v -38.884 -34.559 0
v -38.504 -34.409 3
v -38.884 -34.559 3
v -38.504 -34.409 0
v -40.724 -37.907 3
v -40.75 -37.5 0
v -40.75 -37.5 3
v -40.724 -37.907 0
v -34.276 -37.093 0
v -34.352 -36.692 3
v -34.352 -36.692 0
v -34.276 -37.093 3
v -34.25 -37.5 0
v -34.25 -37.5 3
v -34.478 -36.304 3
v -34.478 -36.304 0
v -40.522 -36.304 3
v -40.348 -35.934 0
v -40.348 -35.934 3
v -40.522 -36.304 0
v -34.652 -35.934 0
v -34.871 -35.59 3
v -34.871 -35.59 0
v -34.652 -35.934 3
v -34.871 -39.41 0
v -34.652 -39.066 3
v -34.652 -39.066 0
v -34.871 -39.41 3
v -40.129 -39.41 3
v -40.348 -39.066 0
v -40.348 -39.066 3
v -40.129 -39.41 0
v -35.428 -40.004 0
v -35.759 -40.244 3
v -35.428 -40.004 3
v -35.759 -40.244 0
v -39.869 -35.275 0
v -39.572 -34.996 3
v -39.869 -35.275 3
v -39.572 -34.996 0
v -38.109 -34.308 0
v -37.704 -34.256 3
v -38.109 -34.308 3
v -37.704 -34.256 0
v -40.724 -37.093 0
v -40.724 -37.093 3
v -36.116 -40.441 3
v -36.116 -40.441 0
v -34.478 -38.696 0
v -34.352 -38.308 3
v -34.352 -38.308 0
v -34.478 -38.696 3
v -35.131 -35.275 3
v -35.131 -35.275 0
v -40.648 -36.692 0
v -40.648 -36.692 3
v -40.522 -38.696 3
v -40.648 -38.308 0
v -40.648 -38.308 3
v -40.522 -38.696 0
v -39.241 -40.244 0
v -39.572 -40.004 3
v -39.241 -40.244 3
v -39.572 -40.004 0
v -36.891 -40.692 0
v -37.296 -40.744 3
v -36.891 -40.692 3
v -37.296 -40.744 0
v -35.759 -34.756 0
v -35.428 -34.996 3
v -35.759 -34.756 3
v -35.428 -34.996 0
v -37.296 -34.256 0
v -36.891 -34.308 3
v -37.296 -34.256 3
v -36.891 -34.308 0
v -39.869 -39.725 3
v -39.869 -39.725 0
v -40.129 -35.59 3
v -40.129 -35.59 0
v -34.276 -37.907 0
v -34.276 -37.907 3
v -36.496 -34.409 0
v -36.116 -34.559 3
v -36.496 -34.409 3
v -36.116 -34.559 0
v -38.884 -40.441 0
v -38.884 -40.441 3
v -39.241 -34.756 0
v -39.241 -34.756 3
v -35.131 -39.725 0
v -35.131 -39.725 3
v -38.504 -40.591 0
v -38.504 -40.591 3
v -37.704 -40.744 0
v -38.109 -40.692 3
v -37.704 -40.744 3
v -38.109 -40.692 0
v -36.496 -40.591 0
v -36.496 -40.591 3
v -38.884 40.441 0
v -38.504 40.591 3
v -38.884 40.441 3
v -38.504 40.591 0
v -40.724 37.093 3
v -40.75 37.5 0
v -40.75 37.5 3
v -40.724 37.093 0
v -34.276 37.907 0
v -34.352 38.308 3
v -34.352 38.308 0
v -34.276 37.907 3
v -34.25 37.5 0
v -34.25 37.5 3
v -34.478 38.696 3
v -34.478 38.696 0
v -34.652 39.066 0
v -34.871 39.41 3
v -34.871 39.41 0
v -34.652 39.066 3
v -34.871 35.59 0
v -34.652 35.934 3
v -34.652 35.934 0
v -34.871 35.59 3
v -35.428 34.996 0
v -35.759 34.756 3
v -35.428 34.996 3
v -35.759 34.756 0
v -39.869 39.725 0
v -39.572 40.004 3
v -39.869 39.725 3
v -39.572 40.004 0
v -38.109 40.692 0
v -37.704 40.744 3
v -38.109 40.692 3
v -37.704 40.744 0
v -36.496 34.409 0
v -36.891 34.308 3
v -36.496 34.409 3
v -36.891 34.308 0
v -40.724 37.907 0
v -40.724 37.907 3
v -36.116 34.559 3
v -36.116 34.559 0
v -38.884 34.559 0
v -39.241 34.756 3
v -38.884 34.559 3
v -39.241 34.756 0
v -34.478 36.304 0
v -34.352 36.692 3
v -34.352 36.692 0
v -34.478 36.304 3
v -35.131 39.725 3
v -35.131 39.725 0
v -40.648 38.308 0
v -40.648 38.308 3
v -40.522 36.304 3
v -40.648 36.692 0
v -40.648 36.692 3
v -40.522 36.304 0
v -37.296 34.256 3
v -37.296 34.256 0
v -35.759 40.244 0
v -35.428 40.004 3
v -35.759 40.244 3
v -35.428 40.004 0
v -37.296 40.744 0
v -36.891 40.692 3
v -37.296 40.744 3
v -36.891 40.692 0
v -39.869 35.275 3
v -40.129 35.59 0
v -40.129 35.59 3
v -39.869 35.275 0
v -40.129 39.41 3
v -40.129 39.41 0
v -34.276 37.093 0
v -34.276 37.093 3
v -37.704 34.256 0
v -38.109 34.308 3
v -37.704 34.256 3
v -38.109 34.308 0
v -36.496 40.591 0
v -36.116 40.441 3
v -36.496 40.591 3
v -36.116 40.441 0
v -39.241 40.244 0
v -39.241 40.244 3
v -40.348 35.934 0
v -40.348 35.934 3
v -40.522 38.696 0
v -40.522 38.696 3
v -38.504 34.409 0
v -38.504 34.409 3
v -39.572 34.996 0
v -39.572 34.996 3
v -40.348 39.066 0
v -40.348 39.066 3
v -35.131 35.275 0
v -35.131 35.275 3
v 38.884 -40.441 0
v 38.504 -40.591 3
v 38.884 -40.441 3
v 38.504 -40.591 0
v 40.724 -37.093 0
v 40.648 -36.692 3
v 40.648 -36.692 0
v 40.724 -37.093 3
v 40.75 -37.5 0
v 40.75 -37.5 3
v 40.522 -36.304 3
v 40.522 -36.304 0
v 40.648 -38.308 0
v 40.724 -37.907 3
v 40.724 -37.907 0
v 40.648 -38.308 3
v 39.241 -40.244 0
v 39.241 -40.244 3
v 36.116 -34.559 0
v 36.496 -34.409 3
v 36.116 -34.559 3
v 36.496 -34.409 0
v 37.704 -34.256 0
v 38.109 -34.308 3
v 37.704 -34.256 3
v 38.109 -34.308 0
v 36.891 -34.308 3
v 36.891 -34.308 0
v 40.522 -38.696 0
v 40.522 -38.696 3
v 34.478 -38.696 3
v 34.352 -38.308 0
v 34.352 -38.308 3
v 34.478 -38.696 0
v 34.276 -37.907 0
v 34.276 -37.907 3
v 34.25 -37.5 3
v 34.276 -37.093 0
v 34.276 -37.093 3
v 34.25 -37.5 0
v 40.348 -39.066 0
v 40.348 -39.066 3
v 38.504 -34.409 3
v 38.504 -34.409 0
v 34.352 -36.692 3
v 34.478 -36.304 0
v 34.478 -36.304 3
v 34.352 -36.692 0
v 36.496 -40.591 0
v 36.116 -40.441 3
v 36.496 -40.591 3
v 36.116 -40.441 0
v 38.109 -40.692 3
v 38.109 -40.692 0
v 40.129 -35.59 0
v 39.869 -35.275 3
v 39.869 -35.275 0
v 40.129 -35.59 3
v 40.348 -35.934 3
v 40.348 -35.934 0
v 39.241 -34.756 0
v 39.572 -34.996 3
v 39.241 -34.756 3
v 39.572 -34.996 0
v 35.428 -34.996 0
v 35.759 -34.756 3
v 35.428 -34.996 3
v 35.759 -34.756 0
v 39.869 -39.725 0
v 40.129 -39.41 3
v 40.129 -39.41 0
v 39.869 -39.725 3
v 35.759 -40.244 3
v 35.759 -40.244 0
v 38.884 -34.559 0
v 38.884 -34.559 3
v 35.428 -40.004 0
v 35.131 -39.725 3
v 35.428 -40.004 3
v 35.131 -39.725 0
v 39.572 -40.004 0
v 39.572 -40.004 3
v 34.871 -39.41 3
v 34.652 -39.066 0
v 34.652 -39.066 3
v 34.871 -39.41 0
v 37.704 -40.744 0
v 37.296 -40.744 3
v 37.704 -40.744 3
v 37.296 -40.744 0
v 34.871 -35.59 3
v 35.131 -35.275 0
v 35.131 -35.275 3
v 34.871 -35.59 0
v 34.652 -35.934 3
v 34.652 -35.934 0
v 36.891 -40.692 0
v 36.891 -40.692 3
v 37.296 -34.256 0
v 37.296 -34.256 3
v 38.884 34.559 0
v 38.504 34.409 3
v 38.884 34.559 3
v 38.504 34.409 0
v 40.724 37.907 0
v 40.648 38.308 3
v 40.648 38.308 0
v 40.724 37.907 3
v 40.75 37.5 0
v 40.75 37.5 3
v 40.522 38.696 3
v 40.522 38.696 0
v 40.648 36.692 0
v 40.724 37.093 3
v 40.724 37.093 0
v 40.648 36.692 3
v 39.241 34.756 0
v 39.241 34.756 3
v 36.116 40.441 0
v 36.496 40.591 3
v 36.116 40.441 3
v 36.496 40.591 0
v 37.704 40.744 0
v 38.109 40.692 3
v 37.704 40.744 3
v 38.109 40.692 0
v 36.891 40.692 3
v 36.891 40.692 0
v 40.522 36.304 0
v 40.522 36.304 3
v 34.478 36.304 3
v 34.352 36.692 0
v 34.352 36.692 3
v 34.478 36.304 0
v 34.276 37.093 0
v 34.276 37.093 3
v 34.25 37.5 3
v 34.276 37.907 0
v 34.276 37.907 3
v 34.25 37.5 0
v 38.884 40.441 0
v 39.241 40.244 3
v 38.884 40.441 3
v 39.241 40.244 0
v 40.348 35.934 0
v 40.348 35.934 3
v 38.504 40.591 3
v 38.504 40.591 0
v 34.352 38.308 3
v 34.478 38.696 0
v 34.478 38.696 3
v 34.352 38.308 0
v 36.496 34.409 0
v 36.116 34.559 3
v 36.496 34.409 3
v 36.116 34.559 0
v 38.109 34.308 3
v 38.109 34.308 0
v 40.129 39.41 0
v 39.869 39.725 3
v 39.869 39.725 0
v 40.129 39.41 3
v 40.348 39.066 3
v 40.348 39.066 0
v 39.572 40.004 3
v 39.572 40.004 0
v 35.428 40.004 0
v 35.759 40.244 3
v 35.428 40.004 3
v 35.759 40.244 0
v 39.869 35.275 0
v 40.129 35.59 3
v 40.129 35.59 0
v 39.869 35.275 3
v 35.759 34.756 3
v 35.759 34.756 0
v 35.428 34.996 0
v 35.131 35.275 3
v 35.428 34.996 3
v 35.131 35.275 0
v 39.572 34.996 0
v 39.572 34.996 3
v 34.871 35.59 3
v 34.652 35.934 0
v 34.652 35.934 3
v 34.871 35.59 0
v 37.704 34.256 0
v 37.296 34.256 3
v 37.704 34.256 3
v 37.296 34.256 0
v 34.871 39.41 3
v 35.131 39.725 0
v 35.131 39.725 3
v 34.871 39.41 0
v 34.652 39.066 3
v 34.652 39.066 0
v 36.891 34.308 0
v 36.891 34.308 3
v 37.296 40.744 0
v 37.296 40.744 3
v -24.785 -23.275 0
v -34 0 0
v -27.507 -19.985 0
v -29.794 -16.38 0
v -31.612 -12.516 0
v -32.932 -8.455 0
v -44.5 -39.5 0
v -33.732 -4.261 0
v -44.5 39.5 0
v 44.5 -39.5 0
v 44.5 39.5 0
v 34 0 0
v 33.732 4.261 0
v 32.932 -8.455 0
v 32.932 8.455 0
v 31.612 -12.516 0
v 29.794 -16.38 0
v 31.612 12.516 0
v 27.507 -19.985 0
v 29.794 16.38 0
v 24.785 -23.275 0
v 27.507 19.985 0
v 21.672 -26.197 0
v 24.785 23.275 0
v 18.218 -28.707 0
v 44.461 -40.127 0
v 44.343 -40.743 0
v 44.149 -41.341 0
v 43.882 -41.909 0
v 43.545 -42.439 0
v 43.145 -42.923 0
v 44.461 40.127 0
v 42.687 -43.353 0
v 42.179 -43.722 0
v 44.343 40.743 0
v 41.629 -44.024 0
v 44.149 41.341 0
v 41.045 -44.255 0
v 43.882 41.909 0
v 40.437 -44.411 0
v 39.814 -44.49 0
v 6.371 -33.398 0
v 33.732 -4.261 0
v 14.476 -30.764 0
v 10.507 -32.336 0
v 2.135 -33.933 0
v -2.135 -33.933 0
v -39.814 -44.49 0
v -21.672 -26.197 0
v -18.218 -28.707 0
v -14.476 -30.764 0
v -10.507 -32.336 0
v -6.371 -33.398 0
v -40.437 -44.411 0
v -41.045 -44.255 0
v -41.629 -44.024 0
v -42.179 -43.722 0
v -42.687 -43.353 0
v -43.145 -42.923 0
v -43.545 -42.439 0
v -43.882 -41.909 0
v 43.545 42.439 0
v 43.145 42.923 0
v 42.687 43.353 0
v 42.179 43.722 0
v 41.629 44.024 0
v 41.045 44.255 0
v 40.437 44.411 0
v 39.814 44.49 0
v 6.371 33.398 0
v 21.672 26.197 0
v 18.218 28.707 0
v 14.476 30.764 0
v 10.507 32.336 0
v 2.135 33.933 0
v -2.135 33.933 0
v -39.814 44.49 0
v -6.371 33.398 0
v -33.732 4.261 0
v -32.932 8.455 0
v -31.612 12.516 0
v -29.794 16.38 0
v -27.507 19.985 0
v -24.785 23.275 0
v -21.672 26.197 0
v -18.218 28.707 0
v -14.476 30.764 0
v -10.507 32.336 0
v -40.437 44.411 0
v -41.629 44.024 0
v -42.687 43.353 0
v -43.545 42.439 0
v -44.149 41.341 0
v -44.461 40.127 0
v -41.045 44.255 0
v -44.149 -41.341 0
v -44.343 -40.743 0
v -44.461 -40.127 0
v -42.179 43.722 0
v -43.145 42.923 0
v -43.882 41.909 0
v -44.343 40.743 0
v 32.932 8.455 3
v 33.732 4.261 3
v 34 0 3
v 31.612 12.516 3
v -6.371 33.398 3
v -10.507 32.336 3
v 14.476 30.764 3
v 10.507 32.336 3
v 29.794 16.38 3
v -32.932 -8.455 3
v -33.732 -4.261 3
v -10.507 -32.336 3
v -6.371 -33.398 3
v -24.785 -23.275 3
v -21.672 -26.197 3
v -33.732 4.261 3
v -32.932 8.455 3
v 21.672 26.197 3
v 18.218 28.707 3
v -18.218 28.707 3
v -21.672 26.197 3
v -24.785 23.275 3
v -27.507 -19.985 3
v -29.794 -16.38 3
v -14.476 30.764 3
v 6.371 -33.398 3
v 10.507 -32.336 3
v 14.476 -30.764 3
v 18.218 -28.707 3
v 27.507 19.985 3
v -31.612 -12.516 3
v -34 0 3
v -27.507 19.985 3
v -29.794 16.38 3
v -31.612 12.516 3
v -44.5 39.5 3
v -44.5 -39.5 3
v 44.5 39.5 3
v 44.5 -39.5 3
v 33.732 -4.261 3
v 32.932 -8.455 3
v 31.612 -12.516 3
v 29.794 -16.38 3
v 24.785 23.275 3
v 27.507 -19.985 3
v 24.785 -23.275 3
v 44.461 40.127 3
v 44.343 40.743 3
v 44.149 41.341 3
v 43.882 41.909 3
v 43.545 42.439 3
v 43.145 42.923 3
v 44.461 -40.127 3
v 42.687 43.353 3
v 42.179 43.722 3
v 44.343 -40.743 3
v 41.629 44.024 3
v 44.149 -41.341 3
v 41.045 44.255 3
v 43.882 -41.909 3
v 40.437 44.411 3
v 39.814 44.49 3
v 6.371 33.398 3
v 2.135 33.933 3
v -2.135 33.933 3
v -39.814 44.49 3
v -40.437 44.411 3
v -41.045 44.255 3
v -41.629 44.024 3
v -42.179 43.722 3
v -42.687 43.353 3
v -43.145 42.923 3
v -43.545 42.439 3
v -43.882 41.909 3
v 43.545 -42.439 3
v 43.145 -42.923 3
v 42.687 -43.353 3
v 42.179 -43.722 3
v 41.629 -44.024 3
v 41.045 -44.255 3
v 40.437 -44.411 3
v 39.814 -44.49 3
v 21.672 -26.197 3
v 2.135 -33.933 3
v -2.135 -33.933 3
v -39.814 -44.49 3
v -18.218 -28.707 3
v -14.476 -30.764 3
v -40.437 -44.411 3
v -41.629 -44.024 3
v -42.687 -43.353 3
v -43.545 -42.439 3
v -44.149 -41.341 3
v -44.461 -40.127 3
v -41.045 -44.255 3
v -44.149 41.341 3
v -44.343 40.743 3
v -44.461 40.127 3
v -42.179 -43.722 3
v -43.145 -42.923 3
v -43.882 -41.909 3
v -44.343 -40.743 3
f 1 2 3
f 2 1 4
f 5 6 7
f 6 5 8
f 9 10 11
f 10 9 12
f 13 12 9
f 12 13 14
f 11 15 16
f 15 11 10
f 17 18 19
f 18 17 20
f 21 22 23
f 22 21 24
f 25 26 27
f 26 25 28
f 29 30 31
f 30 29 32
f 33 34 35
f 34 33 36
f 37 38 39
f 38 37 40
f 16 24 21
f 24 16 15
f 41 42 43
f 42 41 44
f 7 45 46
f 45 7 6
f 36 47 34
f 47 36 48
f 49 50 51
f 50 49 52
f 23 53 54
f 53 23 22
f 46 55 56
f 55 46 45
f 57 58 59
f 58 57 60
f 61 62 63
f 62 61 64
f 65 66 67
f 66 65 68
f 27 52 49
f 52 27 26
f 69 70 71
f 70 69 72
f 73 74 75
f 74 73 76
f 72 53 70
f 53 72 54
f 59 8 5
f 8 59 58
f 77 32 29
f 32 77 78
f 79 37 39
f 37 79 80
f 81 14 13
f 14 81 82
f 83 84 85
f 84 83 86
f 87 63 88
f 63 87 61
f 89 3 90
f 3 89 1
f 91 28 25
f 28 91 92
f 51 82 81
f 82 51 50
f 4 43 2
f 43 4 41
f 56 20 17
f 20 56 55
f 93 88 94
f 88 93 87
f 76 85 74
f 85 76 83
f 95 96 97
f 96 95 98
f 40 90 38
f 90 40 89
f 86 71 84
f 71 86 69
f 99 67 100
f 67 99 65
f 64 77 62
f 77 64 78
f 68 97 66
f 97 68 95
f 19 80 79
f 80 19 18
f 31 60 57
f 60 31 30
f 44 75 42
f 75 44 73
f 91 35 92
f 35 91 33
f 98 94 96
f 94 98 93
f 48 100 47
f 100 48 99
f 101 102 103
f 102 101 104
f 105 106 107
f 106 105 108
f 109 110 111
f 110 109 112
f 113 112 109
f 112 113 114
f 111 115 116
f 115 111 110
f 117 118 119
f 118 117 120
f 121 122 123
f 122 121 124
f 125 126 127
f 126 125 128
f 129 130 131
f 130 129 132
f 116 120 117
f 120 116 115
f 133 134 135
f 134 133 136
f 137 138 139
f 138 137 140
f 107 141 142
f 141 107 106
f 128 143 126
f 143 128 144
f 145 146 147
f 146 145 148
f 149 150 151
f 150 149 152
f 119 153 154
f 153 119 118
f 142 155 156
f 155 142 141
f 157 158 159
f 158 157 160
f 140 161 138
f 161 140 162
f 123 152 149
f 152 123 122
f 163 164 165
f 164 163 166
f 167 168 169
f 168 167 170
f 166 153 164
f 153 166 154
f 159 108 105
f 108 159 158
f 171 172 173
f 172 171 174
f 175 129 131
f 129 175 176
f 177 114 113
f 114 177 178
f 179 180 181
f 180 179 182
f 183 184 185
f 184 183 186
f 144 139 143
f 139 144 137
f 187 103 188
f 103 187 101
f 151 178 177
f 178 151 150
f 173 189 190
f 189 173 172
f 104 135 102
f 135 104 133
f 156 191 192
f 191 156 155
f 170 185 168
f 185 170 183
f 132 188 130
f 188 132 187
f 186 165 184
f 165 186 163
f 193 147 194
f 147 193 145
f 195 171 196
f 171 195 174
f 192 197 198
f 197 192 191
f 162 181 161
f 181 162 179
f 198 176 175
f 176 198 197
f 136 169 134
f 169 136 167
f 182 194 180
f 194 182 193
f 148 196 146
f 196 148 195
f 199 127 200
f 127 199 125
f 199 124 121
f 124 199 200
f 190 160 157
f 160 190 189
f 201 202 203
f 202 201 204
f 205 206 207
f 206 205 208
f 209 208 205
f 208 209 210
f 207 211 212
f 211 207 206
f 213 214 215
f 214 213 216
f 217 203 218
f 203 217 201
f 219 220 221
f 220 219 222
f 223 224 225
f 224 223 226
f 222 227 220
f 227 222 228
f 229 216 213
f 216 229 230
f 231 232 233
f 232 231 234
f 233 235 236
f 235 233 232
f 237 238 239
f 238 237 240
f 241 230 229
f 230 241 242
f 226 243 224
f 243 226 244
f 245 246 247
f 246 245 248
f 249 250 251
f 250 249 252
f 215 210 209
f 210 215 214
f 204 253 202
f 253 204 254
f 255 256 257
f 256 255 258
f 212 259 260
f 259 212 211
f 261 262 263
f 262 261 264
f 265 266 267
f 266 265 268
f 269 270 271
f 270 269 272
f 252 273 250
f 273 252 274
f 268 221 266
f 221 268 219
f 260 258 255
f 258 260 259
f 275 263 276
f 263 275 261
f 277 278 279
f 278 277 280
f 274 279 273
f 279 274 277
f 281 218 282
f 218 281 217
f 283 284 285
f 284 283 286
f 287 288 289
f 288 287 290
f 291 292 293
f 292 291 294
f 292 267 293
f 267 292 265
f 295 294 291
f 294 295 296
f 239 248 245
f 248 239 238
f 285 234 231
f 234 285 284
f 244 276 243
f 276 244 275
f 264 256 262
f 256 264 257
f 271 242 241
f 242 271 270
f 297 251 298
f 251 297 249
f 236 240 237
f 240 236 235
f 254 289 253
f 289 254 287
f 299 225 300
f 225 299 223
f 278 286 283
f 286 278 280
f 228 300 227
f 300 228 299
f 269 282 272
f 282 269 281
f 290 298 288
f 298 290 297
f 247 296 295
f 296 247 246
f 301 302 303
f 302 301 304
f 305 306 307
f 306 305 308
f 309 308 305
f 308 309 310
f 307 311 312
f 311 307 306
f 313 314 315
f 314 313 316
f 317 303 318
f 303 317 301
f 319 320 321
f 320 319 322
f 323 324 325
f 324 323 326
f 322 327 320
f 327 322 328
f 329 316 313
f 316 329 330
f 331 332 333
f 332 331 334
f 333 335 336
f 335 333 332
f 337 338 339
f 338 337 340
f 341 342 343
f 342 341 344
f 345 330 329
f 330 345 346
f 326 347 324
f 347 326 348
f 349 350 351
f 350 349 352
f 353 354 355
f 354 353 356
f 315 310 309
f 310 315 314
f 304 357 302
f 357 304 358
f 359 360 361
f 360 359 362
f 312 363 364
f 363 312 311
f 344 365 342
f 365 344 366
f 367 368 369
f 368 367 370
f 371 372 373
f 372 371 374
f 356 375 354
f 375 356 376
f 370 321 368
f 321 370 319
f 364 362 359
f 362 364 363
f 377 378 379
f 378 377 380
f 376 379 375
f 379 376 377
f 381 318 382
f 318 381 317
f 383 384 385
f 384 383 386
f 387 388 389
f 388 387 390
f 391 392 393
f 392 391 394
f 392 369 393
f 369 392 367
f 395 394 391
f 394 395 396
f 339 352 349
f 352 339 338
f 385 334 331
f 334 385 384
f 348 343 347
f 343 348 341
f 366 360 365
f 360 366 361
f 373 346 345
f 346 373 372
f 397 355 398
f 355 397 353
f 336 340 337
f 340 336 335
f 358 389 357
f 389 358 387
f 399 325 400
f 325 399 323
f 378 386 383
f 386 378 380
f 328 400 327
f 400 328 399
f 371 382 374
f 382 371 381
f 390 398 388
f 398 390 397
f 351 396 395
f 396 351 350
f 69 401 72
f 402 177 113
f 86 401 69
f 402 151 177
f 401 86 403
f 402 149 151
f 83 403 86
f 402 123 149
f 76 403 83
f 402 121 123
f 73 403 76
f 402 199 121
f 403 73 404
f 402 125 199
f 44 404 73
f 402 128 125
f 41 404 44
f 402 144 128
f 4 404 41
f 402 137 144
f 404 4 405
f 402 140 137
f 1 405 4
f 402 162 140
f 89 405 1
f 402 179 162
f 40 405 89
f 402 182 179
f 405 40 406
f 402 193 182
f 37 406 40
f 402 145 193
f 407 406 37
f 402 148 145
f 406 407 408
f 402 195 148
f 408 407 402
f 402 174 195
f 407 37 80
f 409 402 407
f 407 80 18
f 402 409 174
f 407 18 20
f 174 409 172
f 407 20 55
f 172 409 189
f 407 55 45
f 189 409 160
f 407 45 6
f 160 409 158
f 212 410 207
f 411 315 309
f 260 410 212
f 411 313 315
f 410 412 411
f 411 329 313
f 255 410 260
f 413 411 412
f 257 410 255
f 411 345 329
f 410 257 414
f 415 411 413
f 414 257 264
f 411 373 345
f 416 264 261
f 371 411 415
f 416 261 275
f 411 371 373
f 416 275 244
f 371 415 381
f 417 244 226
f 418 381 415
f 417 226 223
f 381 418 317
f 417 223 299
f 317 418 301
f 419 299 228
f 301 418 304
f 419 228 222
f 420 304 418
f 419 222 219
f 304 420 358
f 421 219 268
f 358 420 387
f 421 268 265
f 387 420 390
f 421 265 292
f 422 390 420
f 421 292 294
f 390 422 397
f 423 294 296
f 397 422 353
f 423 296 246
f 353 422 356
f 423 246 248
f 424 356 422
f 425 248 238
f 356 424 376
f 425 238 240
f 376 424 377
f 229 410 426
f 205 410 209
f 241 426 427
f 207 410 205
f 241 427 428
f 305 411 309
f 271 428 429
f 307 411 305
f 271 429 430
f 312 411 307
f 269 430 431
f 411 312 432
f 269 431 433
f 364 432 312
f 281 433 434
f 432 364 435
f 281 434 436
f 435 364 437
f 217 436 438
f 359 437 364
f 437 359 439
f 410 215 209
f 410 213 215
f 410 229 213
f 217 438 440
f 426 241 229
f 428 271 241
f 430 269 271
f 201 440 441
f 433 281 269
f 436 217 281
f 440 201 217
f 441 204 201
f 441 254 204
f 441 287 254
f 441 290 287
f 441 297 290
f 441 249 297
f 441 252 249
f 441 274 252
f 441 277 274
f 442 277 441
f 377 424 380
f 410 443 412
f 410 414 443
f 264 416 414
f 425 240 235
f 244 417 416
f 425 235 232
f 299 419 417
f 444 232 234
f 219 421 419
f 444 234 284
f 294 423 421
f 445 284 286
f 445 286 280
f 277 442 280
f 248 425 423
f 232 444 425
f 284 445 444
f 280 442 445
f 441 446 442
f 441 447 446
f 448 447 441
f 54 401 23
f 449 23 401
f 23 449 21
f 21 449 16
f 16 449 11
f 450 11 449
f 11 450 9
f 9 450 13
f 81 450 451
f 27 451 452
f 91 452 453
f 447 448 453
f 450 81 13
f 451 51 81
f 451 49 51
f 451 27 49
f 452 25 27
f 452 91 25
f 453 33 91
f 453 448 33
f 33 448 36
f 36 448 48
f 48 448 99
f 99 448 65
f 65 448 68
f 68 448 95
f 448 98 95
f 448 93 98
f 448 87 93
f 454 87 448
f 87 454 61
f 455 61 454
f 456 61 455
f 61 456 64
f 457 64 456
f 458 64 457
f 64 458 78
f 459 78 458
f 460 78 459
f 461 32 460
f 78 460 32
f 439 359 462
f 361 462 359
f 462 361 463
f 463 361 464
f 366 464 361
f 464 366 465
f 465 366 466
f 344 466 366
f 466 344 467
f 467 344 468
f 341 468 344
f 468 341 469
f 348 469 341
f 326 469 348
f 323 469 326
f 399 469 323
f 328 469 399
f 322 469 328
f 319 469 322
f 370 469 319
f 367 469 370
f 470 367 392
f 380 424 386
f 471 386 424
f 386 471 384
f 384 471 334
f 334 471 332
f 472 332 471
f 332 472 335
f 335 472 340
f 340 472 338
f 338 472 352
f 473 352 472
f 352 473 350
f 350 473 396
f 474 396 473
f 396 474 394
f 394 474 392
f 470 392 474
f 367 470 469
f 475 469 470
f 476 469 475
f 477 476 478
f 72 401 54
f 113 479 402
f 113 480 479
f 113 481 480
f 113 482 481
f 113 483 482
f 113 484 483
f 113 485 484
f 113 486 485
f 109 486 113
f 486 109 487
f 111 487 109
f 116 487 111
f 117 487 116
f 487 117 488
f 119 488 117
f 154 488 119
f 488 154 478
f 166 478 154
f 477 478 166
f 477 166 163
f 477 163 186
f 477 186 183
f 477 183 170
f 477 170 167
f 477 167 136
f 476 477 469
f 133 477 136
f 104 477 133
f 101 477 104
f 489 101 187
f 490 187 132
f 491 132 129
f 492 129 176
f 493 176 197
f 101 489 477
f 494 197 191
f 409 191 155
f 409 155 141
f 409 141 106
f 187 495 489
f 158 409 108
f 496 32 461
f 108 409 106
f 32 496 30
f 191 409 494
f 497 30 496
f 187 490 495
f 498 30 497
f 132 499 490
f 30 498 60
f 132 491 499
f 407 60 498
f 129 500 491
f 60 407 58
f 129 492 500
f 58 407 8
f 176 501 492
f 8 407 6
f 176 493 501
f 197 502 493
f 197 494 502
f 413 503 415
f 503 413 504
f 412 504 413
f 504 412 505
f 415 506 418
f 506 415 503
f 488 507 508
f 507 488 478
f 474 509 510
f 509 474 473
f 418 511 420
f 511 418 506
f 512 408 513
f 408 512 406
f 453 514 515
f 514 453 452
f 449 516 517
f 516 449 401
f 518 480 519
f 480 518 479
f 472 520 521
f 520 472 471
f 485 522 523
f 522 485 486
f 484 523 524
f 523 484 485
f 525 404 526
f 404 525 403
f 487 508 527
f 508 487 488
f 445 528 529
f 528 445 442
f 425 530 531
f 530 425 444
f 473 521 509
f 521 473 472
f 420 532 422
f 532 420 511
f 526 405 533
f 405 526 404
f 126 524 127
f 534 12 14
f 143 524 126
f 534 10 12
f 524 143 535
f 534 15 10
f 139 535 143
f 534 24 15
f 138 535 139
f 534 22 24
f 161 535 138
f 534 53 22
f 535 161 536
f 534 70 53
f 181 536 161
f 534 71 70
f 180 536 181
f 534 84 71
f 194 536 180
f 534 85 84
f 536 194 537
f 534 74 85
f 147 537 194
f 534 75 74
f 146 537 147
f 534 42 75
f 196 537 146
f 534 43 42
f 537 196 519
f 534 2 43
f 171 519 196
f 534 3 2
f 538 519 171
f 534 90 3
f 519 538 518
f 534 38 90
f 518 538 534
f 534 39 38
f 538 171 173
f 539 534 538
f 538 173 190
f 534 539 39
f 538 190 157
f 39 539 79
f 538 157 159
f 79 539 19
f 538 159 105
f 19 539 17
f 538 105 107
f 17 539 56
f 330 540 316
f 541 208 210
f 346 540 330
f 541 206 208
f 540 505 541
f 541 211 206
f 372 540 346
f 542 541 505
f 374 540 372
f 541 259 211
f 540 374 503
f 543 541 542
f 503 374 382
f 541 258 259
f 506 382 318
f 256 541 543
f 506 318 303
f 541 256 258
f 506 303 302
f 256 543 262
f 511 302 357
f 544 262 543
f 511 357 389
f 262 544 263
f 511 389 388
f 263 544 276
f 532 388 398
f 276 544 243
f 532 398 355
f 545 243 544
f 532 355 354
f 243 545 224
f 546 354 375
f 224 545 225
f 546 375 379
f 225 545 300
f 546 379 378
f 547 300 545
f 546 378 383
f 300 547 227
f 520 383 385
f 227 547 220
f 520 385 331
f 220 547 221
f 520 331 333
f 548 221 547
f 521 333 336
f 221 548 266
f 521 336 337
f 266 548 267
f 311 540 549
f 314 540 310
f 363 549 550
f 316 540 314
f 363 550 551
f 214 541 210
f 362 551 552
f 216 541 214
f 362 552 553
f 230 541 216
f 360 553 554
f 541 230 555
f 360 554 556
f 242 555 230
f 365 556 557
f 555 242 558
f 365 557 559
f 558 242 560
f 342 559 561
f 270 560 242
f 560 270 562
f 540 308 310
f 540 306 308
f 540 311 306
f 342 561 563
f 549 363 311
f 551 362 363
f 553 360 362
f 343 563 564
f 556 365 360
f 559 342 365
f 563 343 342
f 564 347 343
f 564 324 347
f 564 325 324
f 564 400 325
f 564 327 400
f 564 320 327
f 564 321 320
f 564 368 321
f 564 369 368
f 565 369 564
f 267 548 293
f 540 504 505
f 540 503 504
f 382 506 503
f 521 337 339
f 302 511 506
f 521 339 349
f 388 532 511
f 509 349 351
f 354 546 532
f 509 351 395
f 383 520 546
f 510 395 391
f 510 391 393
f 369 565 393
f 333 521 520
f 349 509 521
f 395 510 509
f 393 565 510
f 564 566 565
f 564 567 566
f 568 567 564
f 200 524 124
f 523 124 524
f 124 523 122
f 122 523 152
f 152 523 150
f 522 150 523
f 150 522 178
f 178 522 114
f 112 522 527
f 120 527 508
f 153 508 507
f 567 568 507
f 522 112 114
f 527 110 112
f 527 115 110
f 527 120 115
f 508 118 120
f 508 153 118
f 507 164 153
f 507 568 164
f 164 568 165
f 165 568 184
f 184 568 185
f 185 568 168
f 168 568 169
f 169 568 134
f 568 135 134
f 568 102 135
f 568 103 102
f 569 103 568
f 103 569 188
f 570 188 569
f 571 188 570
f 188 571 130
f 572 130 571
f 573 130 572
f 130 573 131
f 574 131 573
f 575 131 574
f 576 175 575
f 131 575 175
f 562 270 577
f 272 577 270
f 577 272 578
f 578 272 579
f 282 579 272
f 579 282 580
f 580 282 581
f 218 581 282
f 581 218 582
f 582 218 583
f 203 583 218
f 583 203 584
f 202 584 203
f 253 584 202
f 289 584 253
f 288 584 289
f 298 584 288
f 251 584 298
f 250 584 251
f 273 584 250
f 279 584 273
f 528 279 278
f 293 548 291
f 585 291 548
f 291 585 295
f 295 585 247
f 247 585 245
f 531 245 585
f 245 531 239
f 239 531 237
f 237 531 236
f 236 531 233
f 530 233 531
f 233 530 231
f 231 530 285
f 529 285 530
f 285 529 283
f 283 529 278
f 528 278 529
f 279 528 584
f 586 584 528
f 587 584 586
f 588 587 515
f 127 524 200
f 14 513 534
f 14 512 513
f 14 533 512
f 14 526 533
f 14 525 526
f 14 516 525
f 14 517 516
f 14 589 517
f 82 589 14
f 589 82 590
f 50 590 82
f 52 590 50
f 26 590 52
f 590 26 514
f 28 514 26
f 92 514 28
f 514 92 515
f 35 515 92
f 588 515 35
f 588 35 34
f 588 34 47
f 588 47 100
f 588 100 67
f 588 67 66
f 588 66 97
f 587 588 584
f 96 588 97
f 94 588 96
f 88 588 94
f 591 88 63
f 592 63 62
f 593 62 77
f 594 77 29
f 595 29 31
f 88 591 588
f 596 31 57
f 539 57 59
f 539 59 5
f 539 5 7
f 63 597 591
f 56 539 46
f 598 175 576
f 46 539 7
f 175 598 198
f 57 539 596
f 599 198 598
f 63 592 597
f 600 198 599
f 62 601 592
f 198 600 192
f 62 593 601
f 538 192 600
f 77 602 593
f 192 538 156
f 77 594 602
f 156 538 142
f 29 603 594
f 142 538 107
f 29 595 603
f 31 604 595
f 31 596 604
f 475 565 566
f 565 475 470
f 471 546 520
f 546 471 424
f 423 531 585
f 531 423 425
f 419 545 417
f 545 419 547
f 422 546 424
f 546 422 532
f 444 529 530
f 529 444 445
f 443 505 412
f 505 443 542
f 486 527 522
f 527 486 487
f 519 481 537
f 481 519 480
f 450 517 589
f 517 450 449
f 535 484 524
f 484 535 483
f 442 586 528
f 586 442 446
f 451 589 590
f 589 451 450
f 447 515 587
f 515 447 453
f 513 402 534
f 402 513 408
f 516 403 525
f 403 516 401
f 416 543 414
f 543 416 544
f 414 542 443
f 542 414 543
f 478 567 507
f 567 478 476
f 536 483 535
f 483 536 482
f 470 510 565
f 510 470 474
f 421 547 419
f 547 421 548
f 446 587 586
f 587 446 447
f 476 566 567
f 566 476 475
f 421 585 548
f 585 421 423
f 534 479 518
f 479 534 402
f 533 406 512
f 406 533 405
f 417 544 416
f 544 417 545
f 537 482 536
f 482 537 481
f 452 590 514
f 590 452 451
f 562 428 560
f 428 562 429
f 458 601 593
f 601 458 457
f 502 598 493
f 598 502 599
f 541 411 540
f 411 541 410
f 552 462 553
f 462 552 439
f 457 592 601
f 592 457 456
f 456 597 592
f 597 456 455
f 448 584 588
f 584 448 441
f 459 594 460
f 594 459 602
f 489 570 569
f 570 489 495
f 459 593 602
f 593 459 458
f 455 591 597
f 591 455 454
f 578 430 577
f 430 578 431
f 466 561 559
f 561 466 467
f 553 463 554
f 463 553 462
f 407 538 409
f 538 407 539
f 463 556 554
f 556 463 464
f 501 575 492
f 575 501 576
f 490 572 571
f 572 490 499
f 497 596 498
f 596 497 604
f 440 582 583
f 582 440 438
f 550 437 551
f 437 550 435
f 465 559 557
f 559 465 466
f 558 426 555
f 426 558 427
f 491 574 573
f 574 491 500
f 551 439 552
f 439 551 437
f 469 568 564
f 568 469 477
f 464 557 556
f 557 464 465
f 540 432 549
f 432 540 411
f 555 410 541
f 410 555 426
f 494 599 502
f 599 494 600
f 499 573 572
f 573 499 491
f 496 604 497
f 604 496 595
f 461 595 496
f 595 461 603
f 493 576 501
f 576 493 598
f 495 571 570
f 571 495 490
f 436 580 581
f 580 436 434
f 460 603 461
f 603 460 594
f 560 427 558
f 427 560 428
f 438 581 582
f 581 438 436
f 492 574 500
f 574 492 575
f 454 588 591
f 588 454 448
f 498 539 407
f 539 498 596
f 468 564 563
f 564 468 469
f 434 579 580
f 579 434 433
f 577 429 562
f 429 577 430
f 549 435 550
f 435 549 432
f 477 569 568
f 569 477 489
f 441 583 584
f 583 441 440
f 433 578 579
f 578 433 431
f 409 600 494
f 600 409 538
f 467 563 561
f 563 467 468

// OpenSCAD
$fn = 50;


difference() {
	union() {
		hull() {
			translate(v = [-39.5000000000, 39.5000000000, 0]) {
				cylinder(h = 3, r = 5);
			}
			translate(v = [39.5000000000, 39.5000000000, 0]) {
				cylinder(h = 3, r = 5);
			}
			translate(v = [-39.5000000000, -39.5000000000, 0]) {
				cylinder(h = 3, r = 5);
			}
			translate(v = [39.5000000000, -39.5000000000, 0]) {
				cylinder(h = 3, r = 5);
			}
		}
	}
	union() {
		#translate(v = [-37.5000000000, -37.5000000000, -100.0000000000]) {
			cylinder(h = 200, r = 3.2500000000);
		}
		#translate(v = [-37.5000000000, 37.5000000000, -100.0000000000]) {
			cylinder(h = 200, r = 3.2500000000);
		}
		#translate(v = [37.5000000000, -37.5000000000, -100.0000000000]) {
			cylinder(h = 200, r = 3.2500000000);
		}
		#translate(v = [37.5000000000, 37.5000000000, -100.0000000000]) {
			cylinder(h = 200, r = 3.2500000000);
		}
		#cylinder(h = 3, r = 34.0000000000);
	}
}
